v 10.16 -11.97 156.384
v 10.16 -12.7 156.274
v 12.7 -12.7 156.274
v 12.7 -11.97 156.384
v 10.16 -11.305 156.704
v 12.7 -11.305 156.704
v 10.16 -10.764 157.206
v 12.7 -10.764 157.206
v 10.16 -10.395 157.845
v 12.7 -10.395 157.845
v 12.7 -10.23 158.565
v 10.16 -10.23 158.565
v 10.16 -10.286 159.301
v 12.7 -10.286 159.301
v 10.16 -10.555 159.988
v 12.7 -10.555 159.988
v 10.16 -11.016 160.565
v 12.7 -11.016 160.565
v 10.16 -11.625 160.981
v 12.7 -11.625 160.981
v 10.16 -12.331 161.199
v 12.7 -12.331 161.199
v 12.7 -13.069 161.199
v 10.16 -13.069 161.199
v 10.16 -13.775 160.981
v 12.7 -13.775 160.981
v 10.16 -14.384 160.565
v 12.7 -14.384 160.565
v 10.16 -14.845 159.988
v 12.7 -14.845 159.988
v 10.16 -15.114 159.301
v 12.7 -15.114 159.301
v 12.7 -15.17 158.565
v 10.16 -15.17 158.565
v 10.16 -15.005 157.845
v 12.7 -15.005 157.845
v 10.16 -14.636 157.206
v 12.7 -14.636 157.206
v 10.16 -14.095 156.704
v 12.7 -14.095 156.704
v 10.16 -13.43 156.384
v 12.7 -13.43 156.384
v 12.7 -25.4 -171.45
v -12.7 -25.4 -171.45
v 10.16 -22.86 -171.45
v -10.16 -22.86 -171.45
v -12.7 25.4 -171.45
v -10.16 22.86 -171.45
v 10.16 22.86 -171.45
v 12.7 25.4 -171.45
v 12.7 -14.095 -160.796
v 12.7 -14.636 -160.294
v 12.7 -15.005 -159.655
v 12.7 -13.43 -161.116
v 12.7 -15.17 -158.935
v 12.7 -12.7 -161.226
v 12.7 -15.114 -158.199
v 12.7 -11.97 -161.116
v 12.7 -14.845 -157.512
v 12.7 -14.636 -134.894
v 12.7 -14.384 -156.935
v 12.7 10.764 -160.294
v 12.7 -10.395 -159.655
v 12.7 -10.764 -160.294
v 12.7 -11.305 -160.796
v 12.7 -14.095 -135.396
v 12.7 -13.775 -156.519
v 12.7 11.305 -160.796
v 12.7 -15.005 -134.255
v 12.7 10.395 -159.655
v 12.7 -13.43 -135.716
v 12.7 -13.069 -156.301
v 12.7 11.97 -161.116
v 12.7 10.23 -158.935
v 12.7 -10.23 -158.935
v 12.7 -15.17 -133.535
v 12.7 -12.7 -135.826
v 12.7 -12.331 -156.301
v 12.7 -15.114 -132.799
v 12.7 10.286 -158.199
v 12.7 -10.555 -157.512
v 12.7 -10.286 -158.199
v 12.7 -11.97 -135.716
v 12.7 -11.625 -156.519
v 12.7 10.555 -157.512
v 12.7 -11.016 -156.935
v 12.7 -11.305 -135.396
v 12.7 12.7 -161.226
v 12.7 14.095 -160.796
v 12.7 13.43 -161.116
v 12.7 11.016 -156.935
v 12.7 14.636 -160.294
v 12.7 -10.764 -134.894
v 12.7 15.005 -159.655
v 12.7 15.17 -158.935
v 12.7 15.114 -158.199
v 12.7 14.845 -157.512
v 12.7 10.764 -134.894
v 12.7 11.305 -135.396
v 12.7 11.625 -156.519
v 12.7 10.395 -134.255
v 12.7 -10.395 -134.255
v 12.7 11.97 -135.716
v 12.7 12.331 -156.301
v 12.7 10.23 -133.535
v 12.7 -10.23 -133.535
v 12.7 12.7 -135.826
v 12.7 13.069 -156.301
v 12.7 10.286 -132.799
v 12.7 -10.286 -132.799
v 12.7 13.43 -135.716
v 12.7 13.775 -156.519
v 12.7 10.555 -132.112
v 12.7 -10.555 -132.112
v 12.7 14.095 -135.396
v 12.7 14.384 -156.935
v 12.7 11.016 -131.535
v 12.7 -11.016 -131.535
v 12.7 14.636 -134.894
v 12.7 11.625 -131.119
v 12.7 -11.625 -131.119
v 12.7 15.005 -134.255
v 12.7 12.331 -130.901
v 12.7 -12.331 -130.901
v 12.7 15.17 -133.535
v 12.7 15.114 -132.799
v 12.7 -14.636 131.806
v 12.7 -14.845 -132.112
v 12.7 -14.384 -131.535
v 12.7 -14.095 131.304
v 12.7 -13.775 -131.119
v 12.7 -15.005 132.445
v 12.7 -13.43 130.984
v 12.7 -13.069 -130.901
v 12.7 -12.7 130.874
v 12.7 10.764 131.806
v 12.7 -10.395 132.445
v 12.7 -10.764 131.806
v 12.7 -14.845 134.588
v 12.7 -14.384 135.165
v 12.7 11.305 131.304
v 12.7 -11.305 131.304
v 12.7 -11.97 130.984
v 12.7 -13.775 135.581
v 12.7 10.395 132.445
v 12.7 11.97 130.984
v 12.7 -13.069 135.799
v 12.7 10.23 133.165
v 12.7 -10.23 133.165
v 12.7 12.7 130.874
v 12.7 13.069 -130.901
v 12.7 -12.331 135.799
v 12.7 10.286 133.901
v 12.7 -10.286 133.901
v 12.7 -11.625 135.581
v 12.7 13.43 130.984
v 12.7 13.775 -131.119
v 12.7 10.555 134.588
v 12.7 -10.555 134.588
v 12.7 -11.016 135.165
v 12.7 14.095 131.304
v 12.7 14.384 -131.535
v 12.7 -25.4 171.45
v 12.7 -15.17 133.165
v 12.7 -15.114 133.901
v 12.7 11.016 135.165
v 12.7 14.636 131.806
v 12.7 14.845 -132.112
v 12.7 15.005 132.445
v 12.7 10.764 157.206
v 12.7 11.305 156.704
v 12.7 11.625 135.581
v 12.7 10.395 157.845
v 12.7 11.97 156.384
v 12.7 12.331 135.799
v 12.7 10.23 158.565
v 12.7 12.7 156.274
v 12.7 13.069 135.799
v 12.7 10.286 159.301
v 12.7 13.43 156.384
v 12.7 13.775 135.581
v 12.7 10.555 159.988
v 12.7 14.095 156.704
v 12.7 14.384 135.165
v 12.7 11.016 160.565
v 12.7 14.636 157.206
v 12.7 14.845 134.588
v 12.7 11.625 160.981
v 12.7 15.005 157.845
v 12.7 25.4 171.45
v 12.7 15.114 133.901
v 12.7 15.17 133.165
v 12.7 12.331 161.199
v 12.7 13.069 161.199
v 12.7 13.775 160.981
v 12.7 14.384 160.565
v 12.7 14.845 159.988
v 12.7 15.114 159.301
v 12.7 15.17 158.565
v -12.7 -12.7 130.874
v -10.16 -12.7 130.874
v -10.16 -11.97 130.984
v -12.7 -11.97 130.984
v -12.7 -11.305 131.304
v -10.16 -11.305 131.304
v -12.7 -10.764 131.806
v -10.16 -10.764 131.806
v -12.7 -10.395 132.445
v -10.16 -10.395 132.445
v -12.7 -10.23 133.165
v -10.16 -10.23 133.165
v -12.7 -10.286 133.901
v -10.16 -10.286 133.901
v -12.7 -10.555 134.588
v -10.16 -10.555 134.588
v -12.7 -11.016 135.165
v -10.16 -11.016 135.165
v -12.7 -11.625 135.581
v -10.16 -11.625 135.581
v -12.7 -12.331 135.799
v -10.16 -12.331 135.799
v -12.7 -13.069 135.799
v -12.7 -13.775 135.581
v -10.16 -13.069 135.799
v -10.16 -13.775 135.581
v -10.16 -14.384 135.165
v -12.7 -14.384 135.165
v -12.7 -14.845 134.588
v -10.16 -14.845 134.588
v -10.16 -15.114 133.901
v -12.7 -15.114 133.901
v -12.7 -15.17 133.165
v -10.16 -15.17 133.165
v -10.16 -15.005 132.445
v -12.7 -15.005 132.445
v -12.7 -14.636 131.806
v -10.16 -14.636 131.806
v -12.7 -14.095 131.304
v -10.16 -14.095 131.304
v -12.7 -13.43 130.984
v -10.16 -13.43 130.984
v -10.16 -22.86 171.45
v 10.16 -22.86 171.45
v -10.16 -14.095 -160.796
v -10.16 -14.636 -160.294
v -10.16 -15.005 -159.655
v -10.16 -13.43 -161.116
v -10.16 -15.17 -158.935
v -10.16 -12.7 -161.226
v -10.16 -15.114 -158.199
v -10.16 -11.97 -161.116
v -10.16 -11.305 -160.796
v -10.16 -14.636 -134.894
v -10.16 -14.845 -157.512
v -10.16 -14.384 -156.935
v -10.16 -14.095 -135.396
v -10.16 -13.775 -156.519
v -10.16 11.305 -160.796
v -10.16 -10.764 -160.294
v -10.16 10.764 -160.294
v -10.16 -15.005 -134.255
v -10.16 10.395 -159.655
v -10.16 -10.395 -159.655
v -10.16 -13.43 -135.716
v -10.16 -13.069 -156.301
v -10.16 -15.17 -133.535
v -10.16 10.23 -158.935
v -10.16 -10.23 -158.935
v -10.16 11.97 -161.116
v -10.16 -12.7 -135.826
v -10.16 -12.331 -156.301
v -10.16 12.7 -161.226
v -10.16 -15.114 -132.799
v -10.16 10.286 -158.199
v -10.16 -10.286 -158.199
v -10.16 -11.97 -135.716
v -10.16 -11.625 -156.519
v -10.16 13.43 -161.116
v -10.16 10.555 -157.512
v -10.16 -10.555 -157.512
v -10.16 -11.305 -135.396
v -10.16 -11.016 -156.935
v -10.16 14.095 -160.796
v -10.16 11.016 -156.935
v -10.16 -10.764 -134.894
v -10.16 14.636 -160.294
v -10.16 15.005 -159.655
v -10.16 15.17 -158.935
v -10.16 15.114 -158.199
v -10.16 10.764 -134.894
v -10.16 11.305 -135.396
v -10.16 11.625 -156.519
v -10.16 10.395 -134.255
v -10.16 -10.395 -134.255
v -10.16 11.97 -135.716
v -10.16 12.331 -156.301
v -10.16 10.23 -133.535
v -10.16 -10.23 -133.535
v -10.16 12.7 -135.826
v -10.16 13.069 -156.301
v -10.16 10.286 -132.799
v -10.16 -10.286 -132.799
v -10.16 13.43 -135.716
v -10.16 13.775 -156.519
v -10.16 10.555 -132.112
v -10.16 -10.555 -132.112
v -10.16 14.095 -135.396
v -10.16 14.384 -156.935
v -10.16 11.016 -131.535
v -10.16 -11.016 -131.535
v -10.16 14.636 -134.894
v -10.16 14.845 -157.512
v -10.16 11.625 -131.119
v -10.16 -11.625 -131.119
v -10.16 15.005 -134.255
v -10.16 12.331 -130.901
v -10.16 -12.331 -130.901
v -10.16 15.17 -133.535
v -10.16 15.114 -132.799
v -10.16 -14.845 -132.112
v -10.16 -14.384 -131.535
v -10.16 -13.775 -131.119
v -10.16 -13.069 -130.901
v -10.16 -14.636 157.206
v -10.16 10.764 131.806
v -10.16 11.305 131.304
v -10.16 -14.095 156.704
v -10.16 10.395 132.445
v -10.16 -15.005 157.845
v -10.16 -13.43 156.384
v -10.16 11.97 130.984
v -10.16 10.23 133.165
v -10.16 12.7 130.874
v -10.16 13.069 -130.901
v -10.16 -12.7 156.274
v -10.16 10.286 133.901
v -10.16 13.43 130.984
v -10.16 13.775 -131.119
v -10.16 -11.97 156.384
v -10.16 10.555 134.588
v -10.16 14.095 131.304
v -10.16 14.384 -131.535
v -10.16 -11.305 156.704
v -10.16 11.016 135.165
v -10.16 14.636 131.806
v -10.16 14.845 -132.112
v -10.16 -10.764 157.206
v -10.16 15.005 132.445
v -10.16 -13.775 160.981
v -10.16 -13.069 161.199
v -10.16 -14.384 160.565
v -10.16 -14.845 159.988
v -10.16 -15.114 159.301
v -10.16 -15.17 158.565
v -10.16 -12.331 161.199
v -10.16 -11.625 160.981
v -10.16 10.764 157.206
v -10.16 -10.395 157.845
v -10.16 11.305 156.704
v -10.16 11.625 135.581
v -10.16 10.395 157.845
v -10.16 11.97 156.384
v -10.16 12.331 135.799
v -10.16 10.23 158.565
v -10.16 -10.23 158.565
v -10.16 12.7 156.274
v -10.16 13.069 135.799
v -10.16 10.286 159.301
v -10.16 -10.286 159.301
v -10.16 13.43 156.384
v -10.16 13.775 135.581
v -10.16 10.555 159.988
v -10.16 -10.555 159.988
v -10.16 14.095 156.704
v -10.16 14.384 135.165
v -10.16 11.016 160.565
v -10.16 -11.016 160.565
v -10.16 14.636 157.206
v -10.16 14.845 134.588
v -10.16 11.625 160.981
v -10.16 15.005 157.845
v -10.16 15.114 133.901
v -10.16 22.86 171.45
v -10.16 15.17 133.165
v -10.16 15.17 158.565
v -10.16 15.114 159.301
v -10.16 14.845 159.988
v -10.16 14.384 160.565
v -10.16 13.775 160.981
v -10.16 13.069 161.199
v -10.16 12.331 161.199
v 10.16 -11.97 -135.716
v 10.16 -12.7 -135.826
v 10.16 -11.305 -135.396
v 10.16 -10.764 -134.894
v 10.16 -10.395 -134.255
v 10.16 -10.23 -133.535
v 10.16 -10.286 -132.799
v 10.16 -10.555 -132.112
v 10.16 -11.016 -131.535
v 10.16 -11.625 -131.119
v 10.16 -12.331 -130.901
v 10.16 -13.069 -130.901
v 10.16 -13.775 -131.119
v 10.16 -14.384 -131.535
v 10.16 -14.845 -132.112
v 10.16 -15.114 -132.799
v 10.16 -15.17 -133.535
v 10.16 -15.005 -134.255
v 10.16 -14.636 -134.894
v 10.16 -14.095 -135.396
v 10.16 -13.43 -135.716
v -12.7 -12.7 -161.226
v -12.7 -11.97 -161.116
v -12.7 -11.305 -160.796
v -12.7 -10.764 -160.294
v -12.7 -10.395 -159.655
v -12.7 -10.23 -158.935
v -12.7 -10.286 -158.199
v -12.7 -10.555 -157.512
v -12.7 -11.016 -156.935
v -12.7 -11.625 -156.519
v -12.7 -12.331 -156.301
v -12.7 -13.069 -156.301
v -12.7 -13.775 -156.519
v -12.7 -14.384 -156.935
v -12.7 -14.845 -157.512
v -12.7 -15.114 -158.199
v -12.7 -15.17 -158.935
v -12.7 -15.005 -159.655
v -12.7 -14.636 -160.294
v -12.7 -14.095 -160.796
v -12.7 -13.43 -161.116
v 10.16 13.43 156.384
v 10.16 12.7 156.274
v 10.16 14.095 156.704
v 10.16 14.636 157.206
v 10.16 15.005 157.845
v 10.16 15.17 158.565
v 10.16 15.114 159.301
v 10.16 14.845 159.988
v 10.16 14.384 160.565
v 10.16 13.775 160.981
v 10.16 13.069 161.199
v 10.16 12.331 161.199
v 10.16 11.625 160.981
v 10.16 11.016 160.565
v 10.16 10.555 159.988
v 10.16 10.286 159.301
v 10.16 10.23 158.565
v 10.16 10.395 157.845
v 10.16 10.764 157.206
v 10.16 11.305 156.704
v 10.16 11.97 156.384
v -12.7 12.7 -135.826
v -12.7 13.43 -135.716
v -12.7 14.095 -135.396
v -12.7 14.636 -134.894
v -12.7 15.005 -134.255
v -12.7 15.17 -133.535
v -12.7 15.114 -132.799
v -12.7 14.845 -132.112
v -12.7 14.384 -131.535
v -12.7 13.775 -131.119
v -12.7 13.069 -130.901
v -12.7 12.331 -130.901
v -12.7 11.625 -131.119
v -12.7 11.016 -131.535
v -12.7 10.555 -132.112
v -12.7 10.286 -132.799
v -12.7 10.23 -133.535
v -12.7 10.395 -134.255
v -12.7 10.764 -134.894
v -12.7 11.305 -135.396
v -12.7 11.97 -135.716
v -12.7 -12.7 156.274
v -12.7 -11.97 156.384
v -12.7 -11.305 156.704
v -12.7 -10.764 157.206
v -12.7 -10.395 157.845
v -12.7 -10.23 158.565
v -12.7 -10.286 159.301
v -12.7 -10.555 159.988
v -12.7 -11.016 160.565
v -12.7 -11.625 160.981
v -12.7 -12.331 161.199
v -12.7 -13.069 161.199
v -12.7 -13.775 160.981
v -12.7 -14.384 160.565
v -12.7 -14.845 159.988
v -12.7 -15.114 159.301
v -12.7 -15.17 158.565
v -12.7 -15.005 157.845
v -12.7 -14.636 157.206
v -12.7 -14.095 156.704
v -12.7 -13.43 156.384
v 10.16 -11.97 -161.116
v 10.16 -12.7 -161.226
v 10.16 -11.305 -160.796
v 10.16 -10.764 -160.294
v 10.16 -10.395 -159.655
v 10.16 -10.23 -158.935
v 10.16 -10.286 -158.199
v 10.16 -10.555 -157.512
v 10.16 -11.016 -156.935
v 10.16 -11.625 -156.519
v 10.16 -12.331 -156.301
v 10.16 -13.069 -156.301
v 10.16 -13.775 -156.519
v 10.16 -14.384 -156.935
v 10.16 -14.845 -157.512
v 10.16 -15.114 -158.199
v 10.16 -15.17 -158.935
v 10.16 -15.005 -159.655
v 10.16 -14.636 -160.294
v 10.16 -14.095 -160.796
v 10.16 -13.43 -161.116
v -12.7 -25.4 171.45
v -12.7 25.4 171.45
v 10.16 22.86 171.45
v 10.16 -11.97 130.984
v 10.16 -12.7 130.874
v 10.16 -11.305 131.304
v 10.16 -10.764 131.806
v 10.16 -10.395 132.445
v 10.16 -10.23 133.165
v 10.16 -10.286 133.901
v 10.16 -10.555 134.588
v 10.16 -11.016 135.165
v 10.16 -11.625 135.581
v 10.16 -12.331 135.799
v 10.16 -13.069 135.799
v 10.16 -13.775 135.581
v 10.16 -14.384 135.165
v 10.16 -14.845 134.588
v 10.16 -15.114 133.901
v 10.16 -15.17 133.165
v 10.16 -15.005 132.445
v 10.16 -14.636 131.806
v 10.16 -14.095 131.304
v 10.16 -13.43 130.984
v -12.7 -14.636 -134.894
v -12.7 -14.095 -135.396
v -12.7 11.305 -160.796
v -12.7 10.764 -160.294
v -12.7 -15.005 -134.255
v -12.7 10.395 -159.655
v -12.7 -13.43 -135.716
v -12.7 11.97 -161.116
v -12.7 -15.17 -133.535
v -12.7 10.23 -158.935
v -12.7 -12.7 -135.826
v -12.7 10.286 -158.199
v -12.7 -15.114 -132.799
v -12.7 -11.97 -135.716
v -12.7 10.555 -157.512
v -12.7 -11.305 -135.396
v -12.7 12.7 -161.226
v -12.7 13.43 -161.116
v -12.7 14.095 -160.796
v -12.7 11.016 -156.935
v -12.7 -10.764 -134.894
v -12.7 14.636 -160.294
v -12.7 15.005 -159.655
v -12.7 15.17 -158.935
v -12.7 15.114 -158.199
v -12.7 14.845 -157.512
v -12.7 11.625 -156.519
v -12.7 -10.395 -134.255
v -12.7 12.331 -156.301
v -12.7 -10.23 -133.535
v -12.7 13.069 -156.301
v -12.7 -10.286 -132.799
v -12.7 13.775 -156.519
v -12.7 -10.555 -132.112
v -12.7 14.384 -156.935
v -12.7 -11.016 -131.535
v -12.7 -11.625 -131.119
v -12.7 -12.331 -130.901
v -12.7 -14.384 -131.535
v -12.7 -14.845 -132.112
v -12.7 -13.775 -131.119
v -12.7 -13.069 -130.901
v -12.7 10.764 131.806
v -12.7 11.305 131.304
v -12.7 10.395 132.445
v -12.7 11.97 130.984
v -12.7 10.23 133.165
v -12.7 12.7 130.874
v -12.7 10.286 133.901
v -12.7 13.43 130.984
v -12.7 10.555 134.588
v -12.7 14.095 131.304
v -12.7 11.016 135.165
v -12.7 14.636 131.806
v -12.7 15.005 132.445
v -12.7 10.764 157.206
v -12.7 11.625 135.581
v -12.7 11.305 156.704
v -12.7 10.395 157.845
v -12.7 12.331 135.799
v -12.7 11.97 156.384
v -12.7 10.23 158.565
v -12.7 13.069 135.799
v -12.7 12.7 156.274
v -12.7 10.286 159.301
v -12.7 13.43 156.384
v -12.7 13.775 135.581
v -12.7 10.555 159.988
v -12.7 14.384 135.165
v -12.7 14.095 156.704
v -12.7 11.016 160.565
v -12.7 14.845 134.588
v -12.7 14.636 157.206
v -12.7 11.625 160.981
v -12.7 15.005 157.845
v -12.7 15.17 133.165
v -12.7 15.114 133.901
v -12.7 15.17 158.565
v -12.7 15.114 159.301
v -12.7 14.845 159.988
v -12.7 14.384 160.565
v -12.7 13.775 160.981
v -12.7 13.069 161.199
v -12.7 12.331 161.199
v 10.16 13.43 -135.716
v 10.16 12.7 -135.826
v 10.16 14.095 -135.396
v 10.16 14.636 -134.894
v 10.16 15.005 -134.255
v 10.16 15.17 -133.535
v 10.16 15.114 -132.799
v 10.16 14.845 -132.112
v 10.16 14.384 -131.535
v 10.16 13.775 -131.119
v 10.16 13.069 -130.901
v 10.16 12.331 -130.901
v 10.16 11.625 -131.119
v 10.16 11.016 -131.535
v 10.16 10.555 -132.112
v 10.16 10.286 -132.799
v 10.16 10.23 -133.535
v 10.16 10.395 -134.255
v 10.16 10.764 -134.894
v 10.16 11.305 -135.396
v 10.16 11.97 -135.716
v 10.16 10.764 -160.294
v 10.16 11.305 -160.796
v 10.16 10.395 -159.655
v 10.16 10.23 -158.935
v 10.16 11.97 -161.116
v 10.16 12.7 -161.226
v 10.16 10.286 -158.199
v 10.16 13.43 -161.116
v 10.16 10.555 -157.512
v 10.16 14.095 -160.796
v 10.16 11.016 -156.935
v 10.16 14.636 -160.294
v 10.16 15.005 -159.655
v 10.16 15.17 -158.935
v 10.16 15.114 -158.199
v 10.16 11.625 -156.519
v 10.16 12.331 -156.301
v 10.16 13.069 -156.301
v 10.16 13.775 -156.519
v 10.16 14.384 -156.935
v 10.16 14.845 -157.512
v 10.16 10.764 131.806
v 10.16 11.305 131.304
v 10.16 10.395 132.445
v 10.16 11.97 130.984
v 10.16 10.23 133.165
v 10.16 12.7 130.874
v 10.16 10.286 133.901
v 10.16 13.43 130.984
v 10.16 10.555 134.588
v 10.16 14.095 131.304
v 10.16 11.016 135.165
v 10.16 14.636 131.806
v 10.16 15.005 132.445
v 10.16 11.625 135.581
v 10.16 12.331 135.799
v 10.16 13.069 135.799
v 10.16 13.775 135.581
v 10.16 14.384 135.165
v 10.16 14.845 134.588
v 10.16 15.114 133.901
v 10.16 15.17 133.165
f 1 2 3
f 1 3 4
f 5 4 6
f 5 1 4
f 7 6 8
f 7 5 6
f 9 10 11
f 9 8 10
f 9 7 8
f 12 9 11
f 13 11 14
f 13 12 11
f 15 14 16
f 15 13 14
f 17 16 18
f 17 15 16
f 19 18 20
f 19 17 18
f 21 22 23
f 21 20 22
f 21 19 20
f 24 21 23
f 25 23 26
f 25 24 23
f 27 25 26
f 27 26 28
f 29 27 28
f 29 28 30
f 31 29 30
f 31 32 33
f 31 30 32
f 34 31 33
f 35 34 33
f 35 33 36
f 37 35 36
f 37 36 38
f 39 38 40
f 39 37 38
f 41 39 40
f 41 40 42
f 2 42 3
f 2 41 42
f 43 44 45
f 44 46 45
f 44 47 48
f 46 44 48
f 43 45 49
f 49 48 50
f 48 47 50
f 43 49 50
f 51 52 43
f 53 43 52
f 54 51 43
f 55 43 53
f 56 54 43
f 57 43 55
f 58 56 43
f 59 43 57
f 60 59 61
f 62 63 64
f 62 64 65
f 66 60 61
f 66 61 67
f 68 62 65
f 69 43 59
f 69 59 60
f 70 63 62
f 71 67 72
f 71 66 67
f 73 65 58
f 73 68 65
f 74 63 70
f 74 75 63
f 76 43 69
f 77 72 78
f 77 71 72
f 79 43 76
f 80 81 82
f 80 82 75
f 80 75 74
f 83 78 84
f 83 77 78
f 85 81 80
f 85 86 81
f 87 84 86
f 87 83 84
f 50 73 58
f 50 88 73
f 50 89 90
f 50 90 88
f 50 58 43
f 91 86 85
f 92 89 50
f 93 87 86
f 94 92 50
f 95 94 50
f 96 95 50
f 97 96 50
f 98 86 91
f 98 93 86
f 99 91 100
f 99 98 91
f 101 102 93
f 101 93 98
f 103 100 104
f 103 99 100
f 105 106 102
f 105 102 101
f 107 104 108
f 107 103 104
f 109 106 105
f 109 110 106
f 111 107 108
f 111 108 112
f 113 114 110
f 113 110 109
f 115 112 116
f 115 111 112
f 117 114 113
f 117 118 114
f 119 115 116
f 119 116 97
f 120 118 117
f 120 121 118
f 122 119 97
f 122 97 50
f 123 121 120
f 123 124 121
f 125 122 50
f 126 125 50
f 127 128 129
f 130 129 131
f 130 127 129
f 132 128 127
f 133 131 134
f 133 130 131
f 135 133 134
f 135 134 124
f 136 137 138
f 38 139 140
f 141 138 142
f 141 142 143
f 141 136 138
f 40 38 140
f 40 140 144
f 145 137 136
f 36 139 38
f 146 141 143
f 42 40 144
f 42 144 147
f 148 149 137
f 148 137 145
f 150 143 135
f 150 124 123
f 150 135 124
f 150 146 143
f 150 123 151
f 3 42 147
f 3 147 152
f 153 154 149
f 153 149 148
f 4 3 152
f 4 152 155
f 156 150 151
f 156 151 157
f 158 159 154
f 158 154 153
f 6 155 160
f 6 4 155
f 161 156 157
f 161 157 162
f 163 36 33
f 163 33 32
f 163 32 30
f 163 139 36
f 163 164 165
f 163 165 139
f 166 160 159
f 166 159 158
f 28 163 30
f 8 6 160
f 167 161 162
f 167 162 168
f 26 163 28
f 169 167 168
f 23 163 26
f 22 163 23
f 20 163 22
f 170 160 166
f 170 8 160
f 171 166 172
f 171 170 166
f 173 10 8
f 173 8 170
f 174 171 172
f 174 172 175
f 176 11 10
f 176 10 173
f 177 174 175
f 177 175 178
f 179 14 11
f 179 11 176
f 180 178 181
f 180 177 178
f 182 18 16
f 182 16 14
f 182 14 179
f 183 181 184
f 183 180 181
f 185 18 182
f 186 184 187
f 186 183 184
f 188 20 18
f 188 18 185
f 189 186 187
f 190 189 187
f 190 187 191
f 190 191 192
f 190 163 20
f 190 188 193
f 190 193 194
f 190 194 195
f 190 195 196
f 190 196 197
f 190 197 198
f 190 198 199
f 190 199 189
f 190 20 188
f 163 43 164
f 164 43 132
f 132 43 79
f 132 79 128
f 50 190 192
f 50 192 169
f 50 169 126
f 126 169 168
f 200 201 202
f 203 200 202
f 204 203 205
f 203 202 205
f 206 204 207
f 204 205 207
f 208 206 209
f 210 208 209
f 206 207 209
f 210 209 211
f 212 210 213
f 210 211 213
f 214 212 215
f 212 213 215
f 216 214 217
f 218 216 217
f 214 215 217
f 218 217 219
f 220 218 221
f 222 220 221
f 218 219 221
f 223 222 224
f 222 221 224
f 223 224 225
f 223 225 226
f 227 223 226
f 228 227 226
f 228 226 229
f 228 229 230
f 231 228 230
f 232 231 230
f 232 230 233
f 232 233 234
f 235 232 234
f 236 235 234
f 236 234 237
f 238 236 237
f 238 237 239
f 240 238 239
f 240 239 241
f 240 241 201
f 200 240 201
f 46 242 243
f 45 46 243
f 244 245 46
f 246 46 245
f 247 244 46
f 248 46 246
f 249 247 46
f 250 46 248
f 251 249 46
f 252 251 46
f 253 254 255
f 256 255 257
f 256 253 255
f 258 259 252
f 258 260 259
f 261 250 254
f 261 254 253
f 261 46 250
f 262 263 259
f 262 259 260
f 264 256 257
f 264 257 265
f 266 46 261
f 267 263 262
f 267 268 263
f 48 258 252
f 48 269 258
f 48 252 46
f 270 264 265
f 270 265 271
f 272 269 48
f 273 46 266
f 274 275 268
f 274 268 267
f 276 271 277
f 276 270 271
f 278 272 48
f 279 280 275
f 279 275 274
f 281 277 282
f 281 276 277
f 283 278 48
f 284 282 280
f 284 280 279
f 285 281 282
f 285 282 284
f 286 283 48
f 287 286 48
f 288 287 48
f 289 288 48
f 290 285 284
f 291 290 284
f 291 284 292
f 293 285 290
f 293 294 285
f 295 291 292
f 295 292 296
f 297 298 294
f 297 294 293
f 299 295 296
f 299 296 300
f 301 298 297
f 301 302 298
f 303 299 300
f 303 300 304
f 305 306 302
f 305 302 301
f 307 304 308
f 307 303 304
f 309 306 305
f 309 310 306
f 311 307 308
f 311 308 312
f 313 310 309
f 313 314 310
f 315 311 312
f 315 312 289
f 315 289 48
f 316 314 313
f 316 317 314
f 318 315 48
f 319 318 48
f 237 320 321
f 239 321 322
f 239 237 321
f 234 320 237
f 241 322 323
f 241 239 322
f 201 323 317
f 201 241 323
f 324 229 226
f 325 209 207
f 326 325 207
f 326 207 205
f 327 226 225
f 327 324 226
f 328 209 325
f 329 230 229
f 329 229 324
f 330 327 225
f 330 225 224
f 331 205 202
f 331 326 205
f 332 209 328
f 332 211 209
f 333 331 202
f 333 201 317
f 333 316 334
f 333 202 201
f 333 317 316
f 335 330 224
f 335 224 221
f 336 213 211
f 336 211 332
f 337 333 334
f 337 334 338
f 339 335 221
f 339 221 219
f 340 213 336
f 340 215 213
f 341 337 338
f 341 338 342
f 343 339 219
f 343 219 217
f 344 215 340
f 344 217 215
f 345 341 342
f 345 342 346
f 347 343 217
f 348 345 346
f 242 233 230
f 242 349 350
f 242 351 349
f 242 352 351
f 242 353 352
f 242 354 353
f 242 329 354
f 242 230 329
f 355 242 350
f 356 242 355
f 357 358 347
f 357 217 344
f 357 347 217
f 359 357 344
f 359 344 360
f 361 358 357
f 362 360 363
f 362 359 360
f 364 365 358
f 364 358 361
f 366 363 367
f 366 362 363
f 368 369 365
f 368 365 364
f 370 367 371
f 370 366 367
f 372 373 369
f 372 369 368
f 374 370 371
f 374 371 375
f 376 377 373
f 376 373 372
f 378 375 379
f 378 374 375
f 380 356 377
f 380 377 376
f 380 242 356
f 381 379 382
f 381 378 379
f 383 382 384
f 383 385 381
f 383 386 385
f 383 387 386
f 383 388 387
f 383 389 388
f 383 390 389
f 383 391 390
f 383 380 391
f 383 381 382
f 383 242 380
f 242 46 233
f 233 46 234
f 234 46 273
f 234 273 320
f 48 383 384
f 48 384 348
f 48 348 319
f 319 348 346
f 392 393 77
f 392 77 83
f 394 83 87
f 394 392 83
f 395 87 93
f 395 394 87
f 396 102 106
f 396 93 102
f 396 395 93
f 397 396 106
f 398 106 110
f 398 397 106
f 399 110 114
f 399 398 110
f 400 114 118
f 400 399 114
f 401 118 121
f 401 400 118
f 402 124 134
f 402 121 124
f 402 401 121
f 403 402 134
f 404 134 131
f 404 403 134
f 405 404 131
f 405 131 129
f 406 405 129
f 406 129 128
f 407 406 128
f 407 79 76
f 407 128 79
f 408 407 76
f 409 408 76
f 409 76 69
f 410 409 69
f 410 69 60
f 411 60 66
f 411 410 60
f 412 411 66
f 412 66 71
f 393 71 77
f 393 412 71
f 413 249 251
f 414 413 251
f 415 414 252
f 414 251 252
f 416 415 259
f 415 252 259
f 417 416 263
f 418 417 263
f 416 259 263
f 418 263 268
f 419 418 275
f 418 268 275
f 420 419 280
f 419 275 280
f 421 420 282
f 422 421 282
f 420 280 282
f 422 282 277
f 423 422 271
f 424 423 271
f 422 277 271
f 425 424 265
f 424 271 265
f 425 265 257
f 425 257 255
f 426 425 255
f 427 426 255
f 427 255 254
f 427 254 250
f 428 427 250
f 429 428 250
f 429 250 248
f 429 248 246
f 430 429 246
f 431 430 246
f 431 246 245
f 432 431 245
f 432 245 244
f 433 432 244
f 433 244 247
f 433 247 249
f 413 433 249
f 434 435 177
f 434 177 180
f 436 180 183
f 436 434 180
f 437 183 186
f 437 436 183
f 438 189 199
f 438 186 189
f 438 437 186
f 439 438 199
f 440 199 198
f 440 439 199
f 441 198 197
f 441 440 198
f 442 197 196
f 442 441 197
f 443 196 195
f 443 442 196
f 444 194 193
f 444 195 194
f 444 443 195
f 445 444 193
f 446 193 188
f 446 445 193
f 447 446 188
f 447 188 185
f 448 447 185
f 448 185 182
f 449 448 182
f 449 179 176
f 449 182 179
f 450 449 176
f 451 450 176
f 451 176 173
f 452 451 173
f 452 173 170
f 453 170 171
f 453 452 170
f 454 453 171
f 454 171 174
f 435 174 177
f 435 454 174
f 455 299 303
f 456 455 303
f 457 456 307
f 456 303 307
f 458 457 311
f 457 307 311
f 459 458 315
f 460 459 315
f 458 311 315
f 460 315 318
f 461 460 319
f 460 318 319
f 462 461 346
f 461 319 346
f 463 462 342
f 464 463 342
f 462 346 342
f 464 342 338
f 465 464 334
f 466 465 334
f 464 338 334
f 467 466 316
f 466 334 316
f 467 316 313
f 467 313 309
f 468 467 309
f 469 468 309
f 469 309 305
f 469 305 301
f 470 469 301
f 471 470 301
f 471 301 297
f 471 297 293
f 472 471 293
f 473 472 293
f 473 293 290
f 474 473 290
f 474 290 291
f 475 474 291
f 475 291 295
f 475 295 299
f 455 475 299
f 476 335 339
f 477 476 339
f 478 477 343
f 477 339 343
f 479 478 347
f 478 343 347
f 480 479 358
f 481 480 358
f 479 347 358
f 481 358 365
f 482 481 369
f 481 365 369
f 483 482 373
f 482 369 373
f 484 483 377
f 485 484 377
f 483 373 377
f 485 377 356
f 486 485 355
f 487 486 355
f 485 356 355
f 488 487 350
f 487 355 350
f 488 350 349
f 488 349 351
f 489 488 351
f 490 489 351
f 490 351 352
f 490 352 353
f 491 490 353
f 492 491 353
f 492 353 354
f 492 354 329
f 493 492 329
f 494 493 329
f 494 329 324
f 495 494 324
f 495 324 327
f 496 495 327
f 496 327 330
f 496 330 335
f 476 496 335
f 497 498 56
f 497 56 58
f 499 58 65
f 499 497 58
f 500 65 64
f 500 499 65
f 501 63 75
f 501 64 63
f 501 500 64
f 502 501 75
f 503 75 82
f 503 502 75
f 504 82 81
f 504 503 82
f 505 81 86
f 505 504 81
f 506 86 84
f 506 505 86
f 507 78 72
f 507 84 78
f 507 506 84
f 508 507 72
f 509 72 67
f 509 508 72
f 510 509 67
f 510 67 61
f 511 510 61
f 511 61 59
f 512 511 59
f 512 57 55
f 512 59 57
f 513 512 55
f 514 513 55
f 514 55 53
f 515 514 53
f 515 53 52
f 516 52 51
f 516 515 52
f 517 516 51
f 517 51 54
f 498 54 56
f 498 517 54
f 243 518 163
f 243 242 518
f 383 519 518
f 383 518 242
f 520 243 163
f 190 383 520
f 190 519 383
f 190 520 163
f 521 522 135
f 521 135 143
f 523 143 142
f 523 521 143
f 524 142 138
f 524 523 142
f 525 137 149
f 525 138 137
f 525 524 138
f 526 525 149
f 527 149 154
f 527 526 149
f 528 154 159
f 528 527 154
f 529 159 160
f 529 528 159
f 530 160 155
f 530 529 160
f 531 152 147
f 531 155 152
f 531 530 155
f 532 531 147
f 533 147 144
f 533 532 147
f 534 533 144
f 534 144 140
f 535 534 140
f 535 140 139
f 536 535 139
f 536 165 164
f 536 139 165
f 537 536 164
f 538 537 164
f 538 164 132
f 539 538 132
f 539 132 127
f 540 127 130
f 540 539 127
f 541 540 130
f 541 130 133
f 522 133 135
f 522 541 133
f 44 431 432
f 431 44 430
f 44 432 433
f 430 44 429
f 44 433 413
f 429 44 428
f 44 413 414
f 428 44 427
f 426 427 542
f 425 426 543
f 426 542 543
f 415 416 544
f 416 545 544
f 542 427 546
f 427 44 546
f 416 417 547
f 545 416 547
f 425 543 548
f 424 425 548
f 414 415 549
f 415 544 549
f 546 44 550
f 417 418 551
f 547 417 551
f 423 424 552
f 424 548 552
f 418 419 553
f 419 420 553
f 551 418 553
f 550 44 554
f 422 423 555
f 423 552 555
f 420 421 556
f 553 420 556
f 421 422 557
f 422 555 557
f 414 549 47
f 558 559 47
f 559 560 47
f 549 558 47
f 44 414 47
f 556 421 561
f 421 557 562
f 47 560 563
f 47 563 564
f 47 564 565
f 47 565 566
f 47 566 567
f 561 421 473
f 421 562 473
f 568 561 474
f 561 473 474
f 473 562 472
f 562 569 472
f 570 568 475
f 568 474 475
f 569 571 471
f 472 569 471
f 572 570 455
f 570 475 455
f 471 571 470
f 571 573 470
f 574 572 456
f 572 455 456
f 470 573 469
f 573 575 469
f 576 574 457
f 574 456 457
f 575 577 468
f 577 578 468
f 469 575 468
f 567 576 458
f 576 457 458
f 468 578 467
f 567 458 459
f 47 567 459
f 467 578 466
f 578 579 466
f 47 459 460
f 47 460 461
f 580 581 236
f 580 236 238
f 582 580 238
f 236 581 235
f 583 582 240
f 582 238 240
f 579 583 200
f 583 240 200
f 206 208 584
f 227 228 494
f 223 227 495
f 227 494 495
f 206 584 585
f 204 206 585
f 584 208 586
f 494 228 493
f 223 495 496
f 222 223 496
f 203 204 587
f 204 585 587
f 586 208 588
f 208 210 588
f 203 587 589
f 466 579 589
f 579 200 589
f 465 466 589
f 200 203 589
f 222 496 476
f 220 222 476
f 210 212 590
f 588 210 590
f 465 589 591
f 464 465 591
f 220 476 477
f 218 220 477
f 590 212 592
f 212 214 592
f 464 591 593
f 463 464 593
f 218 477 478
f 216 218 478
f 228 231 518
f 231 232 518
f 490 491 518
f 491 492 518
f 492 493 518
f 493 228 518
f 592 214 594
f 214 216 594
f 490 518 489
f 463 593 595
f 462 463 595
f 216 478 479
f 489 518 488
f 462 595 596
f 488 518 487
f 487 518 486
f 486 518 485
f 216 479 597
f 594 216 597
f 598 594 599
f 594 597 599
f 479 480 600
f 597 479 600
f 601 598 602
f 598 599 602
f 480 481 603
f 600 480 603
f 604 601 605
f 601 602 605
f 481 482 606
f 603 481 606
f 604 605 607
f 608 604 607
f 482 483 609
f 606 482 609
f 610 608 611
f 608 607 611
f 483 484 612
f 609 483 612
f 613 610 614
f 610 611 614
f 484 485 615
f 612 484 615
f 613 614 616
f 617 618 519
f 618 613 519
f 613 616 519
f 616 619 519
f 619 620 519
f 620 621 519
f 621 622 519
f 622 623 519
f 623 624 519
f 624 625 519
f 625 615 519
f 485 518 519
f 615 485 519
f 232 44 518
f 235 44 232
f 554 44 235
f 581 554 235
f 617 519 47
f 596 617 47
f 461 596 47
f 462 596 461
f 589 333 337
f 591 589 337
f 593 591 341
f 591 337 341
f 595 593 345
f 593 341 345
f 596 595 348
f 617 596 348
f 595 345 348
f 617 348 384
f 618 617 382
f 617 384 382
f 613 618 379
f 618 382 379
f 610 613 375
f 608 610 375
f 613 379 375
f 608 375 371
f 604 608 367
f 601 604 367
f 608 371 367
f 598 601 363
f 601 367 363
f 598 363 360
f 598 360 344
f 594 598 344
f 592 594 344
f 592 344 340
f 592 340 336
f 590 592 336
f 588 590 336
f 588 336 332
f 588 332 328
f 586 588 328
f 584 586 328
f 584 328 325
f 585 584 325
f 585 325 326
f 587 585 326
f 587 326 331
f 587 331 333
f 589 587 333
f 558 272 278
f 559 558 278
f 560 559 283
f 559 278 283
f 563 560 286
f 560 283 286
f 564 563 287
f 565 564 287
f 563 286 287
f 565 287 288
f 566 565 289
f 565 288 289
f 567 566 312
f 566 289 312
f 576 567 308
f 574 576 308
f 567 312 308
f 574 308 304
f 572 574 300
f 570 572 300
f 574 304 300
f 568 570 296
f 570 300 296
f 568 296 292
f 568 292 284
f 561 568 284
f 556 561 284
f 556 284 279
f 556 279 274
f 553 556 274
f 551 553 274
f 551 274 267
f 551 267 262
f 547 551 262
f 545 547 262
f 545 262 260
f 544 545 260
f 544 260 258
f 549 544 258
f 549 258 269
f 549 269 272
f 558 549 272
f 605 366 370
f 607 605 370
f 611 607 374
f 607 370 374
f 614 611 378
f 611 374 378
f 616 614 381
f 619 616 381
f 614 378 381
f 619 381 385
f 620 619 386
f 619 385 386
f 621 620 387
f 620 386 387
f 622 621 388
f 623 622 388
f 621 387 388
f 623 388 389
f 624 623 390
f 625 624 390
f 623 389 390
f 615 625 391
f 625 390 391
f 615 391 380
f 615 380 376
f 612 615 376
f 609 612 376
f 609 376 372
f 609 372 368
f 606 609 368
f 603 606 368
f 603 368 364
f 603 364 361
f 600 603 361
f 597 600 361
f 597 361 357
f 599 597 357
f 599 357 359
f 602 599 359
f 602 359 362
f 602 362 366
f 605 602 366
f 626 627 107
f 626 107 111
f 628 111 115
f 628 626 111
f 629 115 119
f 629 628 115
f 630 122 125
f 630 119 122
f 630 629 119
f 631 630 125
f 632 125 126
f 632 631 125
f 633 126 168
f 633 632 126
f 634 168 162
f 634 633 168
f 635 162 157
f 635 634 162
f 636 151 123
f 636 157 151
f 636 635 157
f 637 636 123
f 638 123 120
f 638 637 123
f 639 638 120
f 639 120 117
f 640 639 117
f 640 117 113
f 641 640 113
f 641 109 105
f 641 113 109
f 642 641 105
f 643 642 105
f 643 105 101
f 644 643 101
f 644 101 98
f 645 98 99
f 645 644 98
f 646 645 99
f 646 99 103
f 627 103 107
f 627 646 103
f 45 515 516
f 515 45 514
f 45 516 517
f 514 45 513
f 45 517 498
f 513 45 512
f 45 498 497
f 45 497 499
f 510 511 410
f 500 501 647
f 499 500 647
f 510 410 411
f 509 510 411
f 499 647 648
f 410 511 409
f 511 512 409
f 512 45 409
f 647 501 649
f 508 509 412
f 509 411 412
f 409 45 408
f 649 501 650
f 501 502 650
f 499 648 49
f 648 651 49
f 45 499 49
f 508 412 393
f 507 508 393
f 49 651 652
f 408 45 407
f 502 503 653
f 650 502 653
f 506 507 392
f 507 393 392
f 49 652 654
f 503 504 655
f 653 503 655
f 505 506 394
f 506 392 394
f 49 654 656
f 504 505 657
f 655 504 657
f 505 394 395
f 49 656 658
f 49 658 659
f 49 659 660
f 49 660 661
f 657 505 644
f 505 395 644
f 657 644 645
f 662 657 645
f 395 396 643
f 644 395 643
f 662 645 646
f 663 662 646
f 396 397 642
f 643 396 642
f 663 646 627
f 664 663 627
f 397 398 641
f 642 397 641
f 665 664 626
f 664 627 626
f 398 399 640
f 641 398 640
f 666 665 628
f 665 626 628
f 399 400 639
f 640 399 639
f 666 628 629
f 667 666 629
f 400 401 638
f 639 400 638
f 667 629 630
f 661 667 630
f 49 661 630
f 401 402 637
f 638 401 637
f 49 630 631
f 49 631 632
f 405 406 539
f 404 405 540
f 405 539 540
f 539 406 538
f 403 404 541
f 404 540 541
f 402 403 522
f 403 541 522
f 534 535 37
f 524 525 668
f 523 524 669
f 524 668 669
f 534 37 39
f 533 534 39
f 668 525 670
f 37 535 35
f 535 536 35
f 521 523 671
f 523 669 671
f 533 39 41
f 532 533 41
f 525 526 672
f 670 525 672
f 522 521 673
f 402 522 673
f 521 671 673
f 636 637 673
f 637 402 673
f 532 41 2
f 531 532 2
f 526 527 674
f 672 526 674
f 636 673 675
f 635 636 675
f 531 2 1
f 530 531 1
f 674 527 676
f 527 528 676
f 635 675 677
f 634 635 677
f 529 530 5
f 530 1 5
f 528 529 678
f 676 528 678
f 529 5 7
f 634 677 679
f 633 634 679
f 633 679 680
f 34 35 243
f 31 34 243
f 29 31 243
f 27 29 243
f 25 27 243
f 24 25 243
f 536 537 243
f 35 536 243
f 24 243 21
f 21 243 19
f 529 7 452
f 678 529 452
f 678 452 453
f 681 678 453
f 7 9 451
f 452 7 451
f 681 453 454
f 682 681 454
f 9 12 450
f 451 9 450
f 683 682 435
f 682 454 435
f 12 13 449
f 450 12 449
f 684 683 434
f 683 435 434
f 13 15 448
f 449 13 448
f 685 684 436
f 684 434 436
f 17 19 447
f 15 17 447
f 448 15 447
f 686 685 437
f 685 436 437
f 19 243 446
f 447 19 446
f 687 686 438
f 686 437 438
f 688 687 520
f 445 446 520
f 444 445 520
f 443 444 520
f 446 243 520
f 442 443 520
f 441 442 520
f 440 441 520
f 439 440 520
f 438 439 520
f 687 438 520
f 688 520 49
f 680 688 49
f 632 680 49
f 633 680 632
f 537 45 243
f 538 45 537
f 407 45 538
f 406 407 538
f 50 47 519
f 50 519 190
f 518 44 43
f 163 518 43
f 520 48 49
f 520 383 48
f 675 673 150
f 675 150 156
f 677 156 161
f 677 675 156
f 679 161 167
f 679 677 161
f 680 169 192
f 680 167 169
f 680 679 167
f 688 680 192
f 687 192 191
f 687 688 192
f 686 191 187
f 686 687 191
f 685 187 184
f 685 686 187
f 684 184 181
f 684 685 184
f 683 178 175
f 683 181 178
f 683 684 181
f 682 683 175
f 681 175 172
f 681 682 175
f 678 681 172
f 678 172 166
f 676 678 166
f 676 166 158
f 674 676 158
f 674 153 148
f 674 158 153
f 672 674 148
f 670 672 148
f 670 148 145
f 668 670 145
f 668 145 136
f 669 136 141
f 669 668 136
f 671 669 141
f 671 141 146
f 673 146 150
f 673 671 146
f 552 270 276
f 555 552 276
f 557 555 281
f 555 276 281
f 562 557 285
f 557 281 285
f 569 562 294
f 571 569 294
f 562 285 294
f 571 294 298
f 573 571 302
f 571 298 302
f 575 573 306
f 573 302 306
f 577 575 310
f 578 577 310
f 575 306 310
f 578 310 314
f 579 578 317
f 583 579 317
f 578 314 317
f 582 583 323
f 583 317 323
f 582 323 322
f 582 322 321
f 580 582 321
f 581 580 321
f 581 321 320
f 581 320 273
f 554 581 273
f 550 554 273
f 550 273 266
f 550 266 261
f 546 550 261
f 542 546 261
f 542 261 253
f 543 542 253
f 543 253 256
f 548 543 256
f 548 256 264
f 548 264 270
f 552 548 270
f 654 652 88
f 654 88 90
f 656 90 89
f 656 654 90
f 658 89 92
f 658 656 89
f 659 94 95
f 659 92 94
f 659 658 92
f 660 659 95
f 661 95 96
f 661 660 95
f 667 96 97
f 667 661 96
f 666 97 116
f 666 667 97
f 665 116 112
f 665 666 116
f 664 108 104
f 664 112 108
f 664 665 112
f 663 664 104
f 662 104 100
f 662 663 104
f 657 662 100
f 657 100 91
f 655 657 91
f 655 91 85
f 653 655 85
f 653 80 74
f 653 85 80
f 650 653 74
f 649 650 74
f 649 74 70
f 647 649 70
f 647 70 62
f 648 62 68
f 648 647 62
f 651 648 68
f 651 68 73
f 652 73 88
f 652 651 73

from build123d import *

# Parameters (mm, degrees)
SKETCH1_W               = 25.4
SKETCH1_H               = 50.8
SKETCH1_W_2             = 20.32
SKETCH1_H_2             = 45.72
EXTRUDE_THIN1_DEPTH     = 171.45
SKETCH2_R               = 2.4765
CUT_EXTRUDE1_DEPTH      = 13.7
CUT_EXTRUDE1_DEPTH_BACK = 13.7


with BuildPart() as part:
    # Sketch1 → Extrude-Thin1 (new body, symmetric)
    with BuildSketch(Plane.XY):
        Rectangle(SKETCH1_W, SKETCH1_H)
        Rectangle(SKETCH1_W_2, SKETCH1_H_2, mode=Mode.SUBTRACT)
    extrude(amount=EXTRUDE_THIN1_DEPTH, both=True)

    # Sketch2 → Cut-Extrude1 (cut, two sides)
    with BuildSketch(Plane(origin=(0, 0, 0), x_dir=(0, 0, -1), z_dir=(1, 0, 0))) as cut_extrude1_sk:
        with Locations((133.35, 12.7)):
            Circle(SKETCH2_R)
        with Locations((133.35, -12.7)):
            Circle(SKETCH2_R)
        with Locations((158.75, -12.7)):
            Circle(SKETCH2_R)
        with Locations((158.75, 12.7)):
            Circle(SKETCH2_R)
        with Locations((-133.35, 12.7)):
            Circle(SKETCH2_R)
        with Locations((-158.75, 12.7)):
            Circle(SKETCH2_R)
        with Locations((-158.75, -12.7)):
            Circle(SKETCH2_R)
        with Locations((-133.35, -12.7)):
            Circle(SKETCH2_R)
    extrude(amount=CUT_EXTRUDE1_DEPTH, mode=Mode.SUBTRACT)
    extrude(cut_extrude1_sk.sketch, amount=-CUT_EXTRUDE1_DEPTH_BACK, mode=Mode.SUBTRACT)


solid = part.part
